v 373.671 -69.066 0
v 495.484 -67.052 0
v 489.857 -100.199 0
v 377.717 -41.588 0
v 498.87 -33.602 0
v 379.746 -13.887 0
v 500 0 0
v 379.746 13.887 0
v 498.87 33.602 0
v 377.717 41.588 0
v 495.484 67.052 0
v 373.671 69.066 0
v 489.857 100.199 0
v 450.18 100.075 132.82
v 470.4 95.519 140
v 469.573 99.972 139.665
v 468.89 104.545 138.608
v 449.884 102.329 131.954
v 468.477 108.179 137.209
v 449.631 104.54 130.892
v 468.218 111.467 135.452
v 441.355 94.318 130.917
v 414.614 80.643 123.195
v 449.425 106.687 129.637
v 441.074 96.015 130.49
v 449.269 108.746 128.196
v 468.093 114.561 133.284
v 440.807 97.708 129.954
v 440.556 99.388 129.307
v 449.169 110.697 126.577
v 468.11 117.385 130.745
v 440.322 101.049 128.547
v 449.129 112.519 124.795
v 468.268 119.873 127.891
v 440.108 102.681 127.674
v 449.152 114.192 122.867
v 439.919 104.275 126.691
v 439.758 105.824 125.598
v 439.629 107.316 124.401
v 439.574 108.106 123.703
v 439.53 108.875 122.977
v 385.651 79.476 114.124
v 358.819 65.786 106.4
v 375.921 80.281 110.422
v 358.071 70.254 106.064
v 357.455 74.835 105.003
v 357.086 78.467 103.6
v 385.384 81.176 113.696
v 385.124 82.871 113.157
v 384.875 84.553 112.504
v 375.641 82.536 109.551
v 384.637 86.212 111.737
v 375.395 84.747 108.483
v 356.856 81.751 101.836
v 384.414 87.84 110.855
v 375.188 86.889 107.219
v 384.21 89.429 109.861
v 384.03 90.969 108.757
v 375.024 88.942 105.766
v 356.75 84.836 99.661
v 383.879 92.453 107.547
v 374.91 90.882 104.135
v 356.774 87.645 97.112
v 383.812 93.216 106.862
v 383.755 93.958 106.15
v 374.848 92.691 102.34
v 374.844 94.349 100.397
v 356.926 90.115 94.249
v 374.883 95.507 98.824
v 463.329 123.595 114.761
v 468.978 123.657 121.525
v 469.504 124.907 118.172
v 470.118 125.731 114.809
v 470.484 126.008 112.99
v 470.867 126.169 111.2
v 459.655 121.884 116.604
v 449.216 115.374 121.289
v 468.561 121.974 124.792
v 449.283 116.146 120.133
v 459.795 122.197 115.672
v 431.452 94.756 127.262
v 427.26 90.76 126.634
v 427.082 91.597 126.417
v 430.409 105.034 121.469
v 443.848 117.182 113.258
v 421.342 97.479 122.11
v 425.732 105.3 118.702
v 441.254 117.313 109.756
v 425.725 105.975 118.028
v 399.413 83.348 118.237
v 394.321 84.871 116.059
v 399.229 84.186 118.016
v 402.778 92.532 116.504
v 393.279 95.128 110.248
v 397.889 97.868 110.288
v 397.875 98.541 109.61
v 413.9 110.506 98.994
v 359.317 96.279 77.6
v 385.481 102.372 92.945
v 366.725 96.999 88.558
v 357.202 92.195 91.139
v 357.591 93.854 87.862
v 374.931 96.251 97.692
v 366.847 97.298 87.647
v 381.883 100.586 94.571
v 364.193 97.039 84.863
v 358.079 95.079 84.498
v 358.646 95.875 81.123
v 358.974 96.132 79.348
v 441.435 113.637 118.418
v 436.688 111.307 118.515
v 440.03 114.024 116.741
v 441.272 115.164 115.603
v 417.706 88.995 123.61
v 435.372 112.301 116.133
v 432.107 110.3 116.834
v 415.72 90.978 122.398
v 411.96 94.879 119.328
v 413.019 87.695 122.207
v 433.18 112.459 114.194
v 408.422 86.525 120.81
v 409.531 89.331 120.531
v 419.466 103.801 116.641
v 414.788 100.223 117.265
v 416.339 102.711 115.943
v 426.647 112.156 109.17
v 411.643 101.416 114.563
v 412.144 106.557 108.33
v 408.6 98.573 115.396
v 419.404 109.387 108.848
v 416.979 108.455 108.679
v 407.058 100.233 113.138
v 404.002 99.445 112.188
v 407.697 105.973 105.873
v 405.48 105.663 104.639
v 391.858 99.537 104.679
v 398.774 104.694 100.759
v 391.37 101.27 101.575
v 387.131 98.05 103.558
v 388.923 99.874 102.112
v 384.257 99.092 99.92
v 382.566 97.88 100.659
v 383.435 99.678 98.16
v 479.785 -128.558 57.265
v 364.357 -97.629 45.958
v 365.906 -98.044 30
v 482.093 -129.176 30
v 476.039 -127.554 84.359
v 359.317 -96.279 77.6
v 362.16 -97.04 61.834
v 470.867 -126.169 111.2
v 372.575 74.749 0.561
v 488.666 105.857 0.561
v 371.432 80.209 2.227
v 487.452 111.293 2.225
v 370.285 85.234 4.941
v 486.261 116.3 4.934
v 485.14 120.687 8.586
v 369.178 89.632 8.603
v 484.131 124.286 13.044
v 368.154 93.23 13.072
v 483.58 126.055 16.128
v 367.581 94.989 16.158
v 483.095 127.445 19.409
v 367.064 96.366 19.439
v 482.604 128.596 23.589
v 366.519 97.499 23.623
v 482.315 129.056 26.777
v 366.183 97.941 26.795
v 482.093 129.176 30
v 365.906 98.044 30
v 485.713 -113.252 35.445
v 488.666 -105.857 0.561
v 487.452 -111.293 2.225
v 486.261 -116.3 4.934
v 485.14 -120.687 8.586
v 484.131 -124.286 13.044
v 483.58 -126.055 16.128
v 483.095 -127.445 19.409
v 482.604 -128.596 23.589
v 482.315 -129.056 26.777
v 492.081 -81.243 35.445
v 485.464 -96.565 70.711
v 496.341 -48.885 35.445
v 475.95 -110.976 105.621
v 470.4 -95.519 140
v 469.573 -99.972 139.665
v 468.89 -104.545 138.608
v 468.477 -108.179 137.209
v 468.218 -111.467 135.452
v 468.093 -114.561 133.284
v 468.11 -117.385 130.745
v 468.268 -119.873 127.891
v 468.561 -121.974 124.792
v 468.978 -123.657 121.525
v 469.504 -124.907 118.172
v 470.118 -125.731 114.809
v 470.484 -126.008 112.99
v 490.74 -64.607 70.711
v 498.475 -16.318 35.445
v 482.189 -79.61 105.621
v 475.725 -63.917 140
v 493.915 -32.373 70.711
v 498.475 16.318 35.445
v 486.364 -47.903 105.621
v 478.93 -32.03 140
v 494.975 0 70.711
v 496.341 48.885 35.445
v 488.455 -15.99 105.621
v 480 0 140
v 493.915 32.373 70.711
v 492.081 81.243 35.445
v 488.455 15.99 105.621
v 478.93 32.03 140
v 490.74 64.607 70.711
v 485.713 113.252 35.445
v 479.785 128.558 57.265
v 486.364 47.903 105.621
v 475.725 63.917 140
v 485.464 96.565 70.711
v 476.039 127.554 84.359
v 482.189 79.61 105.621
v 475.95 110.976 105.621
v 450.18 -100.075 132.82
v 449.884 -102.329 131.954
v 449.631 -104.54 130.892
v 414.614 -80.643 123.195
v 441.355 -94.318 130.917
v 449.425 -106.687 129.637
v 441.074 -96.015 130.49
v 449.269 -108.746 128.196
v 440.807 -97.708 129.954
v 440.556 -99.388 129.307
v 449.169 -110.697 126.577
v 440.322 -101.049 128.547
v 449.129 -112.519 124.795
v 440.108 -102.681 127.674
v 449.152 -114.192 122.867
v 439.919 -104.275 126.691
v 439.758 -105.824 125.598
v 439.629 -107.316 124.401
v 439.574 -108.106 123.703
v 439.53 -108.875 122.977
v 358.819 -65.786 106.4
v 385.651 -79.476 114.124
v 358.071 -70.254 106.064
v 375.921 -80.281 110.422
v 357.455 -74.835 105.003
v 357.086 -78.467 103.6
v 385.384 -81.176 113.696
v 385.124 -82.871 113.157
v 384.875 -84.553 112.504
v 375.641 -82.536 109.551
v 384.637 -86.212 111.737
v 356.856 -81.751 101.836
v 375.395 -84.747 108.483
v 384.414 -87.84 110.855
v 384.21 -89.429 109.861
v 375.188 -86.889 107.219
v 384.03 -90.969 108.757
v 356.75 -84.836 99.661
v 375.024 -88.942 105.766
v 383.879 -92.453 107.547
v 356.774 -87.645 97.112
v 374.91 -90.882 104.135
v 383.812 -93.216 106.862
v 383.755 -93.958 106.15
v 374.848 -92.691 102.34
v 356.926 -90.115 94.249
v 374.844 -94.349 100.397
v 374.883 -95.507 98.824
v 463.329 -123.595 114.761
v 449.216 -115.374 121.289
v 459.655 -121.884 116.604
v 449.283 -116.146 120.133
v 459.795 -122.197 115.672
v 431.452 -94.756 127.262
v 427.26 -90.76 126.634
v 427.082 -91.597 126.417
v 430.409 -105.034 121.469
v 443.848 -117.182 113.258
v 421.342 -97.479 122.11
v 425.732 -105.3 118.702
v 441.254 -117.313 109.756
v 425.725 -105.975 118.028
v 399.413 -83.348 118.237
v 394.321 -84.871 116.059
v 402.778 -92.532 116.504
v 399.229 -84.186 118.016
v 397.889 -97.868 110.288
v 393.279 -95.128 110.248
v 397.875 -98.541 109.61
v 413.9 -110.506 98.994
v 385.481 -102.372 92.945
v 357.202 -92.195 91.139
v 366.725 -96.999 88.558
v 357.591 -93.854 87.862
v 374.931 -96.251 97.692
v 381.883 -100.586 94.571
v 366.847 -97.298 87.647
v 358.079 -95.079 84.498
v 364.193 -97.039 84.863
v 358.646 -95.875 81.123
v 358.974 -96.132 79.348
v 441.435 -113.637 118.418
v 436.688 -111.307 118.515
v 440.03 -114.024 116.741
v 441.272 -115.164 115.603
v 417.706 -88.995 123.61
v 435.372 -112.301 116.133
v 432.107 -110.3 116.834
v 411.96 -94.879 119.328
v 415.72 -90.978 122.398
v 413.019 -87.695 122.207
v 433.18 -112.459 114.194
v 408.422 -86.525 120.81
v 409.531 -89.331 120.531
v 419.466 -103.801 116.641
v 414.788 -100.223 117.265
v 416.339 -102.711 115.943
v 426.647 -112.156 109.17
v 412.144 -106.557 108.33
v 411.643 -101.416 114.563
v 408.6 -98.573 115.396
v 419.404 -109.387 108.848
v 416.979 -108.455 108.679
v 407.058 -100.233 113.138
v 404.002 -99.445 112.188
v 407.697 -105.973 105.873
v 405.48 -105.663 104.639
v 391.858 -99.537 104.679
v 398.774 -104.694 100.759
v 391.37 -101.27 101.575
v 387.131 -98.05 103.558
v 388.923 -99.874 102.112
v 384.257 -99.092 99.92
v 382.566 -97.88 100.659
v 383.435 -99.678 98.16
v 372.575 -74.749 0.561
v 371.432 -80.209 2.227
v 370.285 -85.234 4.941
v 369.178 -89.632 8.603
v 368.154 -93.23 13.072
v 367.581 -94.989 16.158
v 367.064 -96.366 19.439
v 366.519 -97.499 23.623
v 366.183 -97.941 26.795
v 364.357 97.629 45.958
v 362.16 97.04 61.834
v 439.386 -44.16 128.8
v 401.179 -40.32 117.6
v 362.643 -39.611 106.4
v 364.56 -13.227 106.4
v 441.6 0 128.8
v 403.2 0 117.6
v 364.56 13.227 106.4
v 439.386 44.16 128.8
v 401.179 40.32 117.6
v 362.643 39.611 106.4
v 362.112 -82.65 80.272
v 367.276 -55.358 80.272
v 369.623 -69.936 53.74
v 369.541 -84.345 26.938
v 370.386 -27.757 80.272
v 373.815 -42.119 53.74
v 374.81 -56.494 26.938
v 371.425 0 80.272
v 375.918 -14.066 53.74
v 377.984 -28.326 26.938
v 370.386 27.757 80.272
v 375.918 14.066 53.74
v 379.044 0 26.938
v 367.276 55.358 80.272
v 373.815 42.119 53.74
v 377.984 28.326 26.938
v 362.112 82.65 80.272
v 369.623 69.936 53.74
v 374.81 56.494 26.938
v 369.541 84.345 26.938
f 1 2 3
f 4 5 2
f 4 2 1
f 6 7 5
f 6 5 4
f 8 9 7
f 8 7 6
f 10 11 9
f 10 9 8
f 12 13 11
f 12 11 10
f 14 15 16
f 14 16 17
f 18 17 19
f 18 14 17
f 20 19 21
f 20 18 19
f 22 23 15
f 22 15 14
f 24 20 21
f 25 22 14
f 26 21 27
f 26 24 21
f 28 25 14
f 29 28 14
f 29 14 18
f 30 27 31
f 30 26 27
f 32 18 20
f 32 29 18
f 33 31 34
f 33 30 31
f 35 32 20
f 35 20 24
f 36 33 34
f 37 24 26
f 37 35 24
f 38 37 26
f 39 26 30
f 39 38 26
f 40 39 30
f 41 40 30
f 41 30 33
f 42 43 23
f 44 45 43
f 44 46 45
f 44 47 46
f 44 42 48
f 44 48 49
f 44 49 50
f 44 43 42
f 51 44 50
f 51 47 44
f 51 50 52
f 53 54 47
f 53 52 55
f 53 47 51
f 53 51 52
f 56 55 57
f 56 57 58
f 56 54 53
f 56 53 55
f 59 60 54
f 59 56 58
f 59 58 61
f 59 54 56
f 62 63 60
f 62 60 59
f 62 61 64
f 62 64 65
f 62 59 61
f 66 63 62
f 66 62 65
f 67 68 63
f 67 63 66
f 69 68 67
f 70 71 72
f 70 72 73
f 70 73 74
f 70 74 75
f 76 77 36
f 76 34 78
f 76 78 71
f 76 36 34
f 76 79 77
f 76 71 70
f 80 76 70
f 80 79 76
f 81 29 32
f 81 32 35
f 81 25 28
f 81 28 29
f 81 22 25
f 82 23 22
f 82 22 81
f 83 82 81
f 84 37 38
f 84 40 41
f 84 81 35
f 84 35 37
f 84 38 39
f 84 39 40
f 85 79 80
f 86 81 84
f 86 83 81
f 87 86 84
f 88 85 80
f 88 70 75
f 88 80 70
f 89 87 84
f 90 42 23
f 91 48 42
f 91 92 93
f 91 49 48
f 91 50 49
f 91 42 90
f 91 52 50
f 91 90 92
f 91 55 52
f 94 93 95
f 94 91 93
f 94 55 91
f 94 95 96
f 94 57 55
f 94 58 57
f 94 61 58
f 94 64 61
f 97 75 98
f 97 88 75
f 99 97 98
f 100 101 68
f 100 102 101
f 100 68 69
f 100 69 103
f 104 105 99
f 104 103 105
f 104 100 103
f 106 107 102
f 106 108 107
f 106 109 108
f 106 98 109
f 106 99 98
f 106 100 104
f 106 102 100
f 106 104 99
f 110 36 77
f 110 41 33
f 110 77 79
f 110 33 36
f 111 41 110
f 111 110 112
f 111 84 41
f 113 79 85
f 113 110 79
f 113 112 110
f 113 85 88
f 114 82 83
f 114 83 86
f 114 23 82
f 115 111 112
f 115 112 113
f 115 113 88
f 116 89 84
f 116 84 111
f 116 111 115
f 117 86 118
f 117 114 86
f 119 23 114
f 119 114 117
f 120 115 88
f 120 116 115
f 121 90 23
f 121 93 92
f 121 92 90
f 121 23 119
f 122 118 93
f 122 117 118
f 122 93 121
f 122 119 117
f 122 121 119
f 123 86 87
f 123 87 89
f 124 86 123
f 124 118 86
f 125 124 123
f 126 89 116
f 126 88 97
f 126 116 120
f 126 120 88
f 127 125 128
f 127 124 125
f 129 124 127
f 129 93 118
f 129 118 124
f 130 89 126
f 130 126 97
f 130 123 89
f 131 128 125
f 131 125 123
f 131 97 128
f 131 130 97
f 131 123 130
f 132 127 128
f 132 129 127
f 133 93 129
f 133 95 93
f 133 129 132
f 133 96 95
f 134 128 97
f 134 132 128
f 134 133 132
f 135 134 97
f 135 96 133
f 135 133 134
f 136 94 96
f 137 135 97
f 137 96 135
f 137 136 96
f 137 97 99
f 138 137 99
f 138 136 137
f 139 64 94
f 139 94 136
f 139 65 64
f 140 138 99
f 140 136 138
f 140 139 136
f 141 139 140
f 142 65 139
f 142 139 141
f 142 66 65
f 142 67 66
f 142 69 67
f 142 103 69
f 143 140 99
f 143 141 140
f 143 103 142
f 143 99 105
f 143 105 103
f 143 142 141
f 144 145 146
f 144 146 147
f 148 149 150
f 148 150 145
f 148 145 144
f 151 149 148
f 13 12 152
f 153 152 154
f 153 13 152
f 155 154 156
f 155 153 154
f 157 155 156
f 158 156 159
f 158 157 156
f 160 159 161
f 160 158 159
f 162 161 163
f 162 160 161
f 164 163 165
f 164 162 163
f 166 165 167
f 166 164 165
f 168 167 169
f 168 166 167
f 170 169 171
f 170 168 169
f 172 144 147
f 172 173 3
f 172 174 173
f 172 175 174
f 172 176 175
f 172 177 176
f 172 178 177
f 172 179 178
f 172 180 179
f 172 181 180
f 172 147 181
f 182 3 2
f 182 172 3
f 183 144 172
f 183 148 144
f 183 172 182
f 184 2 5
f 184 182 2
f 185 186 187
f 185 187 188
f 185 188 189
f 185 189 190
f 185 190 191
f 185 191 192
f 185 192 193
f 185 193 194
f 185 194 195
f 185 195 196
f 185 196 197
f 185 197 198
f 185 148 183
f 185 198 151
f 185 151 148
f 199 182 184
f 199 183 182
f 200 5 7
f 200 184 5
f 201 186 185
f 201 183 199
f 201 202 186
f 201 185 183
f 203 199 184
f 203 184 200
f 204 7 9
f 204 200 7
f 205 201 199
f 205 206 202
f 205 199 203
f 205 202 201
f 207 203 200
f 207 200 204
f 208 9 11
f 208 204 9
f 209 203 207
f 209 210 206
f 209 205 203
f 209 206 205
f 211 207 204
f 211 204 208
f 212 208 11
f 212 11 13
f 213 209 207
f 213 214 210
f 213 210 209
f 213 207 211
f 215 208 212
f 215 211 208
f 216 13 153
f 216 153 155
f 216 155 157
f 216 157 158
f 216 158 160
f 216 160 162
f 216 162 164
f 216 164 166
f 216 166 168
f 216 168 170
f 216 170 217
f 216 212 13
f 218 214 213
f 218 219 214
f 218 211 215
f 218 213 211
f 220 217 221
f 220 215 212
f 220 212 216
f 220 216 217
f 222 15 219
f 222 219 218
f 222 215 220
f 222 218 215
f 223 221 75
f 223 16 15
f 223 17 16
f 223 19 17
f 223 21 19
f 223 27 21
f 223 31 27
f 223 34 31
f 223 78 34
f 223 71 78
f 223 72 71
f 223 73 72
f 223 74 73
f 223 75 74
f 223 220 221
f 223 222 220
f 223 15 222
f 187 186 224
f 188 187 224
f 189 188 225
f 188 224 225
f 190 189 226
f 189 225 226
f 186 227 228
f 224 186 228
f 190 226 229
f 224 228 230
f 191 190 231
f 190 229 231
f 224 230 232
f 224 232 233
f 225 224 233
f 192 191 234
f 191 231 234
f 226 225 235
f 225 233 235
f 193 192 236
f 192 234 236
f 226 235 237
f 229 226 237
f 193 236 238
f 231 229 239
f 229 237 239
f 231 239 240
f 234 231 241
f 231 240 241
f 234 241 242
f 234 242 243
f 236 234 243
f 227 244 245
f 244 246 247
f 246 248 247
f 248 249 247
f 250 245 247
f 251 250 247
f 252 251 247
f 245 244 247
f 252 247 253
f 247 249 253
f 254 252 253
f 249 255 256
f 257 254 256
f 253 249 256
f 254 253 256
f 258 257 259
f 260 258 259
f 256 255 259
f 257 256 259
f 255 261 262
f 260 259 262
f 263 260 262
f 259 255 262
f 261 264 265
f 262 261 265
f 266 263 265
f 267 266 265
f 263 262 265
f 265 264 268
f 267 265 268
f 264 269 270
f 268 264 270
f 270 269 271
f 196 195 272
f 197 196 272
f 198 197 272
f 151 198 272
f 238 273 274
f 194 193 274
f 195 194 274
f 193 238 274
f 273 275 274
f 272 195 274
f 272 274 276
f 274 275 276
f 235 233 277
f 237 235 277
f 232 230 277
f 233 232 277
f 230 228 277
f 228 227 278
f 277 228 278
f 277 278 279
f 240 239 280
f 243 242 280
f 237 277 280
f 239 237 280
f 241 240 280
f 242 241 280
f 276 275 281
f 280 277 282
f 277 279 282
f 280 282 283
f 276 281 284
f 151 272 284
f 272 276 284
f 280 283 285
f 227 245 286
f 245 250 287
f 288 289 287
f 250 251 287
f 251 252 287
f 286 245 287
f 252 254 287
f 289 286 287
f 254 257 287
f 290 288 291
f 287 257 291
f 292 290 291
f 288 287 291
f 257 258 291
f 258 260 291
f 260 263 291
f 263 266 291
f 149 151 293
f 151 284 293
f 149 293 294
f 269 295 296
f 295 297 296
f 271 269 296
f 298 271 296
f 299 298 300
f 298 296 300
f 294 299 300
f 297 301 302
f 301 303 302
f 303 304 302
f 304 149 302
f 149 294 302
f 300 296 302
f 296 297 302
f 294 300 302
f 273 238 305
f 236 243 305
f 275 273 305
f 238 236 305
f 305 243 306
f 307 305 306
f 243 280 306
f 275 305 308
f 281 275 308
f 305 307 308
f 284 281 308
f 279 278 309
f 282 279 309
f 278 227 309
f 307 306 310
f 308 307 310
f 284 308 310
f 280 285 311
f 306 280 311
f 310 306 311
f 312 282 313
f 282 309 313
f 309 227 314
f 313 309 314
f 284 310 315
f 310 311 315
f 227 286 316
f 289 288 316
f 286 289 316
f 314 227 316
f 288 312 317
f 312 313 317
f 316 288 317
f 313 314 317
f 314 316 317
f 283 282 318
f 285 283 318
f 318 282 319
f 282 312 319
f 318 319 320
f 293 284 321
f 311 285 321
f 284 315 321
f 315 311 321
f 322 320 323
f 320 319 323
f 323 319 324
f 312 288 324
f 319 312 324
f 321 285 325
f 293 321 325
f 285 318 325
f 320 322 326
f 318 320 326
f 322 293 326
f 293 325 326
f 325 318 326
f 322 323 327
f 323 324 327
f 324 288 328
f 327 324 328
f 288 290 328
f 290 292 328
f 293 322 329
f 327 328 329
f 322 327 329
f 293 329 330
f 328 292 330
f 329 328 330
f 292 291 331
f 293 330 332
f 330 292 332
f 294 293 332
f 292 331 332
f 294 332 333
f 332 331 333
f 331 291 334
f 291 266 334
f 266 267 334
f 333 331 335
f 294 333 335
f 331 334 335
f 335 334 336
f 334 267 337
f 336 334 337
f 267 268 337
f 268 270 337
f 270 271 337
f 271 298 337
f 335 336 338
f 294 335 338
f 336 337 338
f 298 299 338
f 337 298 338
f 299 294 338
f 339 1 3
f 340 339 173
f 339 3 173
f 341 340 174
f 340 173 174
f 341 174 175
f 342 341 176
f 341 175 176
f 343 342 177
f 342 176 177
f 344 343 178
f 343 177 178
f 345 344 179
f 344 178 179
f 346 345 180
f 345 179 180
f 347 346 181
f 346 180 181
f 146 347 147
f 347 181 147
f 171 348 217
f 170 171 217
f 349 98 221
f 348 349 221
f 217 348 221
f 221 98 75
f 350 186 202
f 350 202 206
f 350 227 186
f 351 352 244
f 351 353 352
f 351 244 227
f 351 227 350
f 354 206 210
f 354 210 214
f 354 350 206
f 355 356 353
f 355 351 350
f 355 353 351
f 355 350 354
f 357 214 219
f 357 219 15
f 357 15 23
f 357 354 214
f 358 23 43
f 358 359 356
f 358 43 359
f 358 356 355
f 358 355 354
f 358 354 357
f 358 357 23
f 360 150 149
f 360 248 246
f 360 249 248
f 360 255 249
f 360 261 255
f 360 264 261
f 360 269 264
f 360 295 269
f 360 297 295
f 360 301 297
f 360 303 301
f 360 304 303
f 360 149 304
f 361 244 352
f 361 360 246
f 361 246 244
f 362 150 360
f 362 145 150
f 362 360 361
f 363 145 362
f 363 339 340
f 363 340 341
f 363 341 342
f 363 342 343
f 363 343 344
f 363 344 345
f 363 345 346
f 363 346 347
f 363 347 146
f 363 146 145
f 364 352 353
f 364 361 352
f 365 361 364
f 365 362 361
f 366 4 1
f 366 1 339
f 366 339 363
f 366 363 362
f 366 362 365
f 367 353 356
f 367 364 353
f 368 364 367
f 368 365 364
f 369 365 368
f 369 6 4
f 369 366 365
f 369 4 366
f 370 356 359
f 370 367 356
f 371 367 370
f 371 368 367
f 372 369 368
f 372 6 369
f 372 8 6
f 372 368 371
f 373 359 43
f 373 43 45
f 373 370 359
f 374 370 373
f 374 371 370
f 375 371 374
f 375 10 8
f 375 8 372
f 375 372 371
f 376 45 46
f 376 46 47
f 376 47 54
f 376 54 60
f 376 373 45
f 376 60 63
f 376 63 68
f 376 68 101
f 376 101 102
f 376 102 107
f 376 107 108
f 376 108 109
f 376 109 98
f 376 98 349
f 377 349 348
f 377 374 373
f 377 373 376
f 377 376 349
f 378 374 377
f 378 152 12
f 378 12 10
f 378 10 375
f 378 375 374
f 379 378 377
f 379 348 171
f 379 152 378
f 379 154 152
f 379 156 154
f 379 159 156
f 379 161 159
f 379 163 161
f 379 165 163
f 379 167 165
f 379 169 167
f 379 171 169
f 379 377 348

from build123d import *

# Parameters (mm, degrees)
F1_ANGLE_BACK = 15
F1_ANGLE      = 30
F2_R          = 30


with BuildPart() as f1:
    # F0 (on Front) → F1 (revolve)
    with BuildSketch(Plane.XZ, mode=Mode.PRIVATE) as f1_sk:
        with BuildLine():
            Line((380, 0), (500, 0))
            ThreePointArc((500, 0), (494.9747468306, 70.7106781187), (480, 140))
            Line((480, 140), (364.8, 106.4))
            ThreePointArc((364.8, 106.4), (376.1808075912, 53.7401153702), (380, 0))
        make_face()
    revolve(f1_sk.sketch.rotate(Axis((0, 0, 25.3354795277), (0, 0, 1)), -F1_ANGLE_BACK), axis=Axis((0, 0, 25.3354795277), (0, 0, 1)), revolution_arc=F1_ANGLE)

    # F2
    f2_edges = [f1.edges().sort_by_distance(p)[0] for p in [
        (408.007069, -109.325165, 123.2),
        (425.007364, -113.88038, 0),
        (425.007364, 113.88038, 0),
        (408.007069, 109.325165, 123.2),
    ]]
    fillet(f2_edges, radius=F2_R)


solid = f1.part
